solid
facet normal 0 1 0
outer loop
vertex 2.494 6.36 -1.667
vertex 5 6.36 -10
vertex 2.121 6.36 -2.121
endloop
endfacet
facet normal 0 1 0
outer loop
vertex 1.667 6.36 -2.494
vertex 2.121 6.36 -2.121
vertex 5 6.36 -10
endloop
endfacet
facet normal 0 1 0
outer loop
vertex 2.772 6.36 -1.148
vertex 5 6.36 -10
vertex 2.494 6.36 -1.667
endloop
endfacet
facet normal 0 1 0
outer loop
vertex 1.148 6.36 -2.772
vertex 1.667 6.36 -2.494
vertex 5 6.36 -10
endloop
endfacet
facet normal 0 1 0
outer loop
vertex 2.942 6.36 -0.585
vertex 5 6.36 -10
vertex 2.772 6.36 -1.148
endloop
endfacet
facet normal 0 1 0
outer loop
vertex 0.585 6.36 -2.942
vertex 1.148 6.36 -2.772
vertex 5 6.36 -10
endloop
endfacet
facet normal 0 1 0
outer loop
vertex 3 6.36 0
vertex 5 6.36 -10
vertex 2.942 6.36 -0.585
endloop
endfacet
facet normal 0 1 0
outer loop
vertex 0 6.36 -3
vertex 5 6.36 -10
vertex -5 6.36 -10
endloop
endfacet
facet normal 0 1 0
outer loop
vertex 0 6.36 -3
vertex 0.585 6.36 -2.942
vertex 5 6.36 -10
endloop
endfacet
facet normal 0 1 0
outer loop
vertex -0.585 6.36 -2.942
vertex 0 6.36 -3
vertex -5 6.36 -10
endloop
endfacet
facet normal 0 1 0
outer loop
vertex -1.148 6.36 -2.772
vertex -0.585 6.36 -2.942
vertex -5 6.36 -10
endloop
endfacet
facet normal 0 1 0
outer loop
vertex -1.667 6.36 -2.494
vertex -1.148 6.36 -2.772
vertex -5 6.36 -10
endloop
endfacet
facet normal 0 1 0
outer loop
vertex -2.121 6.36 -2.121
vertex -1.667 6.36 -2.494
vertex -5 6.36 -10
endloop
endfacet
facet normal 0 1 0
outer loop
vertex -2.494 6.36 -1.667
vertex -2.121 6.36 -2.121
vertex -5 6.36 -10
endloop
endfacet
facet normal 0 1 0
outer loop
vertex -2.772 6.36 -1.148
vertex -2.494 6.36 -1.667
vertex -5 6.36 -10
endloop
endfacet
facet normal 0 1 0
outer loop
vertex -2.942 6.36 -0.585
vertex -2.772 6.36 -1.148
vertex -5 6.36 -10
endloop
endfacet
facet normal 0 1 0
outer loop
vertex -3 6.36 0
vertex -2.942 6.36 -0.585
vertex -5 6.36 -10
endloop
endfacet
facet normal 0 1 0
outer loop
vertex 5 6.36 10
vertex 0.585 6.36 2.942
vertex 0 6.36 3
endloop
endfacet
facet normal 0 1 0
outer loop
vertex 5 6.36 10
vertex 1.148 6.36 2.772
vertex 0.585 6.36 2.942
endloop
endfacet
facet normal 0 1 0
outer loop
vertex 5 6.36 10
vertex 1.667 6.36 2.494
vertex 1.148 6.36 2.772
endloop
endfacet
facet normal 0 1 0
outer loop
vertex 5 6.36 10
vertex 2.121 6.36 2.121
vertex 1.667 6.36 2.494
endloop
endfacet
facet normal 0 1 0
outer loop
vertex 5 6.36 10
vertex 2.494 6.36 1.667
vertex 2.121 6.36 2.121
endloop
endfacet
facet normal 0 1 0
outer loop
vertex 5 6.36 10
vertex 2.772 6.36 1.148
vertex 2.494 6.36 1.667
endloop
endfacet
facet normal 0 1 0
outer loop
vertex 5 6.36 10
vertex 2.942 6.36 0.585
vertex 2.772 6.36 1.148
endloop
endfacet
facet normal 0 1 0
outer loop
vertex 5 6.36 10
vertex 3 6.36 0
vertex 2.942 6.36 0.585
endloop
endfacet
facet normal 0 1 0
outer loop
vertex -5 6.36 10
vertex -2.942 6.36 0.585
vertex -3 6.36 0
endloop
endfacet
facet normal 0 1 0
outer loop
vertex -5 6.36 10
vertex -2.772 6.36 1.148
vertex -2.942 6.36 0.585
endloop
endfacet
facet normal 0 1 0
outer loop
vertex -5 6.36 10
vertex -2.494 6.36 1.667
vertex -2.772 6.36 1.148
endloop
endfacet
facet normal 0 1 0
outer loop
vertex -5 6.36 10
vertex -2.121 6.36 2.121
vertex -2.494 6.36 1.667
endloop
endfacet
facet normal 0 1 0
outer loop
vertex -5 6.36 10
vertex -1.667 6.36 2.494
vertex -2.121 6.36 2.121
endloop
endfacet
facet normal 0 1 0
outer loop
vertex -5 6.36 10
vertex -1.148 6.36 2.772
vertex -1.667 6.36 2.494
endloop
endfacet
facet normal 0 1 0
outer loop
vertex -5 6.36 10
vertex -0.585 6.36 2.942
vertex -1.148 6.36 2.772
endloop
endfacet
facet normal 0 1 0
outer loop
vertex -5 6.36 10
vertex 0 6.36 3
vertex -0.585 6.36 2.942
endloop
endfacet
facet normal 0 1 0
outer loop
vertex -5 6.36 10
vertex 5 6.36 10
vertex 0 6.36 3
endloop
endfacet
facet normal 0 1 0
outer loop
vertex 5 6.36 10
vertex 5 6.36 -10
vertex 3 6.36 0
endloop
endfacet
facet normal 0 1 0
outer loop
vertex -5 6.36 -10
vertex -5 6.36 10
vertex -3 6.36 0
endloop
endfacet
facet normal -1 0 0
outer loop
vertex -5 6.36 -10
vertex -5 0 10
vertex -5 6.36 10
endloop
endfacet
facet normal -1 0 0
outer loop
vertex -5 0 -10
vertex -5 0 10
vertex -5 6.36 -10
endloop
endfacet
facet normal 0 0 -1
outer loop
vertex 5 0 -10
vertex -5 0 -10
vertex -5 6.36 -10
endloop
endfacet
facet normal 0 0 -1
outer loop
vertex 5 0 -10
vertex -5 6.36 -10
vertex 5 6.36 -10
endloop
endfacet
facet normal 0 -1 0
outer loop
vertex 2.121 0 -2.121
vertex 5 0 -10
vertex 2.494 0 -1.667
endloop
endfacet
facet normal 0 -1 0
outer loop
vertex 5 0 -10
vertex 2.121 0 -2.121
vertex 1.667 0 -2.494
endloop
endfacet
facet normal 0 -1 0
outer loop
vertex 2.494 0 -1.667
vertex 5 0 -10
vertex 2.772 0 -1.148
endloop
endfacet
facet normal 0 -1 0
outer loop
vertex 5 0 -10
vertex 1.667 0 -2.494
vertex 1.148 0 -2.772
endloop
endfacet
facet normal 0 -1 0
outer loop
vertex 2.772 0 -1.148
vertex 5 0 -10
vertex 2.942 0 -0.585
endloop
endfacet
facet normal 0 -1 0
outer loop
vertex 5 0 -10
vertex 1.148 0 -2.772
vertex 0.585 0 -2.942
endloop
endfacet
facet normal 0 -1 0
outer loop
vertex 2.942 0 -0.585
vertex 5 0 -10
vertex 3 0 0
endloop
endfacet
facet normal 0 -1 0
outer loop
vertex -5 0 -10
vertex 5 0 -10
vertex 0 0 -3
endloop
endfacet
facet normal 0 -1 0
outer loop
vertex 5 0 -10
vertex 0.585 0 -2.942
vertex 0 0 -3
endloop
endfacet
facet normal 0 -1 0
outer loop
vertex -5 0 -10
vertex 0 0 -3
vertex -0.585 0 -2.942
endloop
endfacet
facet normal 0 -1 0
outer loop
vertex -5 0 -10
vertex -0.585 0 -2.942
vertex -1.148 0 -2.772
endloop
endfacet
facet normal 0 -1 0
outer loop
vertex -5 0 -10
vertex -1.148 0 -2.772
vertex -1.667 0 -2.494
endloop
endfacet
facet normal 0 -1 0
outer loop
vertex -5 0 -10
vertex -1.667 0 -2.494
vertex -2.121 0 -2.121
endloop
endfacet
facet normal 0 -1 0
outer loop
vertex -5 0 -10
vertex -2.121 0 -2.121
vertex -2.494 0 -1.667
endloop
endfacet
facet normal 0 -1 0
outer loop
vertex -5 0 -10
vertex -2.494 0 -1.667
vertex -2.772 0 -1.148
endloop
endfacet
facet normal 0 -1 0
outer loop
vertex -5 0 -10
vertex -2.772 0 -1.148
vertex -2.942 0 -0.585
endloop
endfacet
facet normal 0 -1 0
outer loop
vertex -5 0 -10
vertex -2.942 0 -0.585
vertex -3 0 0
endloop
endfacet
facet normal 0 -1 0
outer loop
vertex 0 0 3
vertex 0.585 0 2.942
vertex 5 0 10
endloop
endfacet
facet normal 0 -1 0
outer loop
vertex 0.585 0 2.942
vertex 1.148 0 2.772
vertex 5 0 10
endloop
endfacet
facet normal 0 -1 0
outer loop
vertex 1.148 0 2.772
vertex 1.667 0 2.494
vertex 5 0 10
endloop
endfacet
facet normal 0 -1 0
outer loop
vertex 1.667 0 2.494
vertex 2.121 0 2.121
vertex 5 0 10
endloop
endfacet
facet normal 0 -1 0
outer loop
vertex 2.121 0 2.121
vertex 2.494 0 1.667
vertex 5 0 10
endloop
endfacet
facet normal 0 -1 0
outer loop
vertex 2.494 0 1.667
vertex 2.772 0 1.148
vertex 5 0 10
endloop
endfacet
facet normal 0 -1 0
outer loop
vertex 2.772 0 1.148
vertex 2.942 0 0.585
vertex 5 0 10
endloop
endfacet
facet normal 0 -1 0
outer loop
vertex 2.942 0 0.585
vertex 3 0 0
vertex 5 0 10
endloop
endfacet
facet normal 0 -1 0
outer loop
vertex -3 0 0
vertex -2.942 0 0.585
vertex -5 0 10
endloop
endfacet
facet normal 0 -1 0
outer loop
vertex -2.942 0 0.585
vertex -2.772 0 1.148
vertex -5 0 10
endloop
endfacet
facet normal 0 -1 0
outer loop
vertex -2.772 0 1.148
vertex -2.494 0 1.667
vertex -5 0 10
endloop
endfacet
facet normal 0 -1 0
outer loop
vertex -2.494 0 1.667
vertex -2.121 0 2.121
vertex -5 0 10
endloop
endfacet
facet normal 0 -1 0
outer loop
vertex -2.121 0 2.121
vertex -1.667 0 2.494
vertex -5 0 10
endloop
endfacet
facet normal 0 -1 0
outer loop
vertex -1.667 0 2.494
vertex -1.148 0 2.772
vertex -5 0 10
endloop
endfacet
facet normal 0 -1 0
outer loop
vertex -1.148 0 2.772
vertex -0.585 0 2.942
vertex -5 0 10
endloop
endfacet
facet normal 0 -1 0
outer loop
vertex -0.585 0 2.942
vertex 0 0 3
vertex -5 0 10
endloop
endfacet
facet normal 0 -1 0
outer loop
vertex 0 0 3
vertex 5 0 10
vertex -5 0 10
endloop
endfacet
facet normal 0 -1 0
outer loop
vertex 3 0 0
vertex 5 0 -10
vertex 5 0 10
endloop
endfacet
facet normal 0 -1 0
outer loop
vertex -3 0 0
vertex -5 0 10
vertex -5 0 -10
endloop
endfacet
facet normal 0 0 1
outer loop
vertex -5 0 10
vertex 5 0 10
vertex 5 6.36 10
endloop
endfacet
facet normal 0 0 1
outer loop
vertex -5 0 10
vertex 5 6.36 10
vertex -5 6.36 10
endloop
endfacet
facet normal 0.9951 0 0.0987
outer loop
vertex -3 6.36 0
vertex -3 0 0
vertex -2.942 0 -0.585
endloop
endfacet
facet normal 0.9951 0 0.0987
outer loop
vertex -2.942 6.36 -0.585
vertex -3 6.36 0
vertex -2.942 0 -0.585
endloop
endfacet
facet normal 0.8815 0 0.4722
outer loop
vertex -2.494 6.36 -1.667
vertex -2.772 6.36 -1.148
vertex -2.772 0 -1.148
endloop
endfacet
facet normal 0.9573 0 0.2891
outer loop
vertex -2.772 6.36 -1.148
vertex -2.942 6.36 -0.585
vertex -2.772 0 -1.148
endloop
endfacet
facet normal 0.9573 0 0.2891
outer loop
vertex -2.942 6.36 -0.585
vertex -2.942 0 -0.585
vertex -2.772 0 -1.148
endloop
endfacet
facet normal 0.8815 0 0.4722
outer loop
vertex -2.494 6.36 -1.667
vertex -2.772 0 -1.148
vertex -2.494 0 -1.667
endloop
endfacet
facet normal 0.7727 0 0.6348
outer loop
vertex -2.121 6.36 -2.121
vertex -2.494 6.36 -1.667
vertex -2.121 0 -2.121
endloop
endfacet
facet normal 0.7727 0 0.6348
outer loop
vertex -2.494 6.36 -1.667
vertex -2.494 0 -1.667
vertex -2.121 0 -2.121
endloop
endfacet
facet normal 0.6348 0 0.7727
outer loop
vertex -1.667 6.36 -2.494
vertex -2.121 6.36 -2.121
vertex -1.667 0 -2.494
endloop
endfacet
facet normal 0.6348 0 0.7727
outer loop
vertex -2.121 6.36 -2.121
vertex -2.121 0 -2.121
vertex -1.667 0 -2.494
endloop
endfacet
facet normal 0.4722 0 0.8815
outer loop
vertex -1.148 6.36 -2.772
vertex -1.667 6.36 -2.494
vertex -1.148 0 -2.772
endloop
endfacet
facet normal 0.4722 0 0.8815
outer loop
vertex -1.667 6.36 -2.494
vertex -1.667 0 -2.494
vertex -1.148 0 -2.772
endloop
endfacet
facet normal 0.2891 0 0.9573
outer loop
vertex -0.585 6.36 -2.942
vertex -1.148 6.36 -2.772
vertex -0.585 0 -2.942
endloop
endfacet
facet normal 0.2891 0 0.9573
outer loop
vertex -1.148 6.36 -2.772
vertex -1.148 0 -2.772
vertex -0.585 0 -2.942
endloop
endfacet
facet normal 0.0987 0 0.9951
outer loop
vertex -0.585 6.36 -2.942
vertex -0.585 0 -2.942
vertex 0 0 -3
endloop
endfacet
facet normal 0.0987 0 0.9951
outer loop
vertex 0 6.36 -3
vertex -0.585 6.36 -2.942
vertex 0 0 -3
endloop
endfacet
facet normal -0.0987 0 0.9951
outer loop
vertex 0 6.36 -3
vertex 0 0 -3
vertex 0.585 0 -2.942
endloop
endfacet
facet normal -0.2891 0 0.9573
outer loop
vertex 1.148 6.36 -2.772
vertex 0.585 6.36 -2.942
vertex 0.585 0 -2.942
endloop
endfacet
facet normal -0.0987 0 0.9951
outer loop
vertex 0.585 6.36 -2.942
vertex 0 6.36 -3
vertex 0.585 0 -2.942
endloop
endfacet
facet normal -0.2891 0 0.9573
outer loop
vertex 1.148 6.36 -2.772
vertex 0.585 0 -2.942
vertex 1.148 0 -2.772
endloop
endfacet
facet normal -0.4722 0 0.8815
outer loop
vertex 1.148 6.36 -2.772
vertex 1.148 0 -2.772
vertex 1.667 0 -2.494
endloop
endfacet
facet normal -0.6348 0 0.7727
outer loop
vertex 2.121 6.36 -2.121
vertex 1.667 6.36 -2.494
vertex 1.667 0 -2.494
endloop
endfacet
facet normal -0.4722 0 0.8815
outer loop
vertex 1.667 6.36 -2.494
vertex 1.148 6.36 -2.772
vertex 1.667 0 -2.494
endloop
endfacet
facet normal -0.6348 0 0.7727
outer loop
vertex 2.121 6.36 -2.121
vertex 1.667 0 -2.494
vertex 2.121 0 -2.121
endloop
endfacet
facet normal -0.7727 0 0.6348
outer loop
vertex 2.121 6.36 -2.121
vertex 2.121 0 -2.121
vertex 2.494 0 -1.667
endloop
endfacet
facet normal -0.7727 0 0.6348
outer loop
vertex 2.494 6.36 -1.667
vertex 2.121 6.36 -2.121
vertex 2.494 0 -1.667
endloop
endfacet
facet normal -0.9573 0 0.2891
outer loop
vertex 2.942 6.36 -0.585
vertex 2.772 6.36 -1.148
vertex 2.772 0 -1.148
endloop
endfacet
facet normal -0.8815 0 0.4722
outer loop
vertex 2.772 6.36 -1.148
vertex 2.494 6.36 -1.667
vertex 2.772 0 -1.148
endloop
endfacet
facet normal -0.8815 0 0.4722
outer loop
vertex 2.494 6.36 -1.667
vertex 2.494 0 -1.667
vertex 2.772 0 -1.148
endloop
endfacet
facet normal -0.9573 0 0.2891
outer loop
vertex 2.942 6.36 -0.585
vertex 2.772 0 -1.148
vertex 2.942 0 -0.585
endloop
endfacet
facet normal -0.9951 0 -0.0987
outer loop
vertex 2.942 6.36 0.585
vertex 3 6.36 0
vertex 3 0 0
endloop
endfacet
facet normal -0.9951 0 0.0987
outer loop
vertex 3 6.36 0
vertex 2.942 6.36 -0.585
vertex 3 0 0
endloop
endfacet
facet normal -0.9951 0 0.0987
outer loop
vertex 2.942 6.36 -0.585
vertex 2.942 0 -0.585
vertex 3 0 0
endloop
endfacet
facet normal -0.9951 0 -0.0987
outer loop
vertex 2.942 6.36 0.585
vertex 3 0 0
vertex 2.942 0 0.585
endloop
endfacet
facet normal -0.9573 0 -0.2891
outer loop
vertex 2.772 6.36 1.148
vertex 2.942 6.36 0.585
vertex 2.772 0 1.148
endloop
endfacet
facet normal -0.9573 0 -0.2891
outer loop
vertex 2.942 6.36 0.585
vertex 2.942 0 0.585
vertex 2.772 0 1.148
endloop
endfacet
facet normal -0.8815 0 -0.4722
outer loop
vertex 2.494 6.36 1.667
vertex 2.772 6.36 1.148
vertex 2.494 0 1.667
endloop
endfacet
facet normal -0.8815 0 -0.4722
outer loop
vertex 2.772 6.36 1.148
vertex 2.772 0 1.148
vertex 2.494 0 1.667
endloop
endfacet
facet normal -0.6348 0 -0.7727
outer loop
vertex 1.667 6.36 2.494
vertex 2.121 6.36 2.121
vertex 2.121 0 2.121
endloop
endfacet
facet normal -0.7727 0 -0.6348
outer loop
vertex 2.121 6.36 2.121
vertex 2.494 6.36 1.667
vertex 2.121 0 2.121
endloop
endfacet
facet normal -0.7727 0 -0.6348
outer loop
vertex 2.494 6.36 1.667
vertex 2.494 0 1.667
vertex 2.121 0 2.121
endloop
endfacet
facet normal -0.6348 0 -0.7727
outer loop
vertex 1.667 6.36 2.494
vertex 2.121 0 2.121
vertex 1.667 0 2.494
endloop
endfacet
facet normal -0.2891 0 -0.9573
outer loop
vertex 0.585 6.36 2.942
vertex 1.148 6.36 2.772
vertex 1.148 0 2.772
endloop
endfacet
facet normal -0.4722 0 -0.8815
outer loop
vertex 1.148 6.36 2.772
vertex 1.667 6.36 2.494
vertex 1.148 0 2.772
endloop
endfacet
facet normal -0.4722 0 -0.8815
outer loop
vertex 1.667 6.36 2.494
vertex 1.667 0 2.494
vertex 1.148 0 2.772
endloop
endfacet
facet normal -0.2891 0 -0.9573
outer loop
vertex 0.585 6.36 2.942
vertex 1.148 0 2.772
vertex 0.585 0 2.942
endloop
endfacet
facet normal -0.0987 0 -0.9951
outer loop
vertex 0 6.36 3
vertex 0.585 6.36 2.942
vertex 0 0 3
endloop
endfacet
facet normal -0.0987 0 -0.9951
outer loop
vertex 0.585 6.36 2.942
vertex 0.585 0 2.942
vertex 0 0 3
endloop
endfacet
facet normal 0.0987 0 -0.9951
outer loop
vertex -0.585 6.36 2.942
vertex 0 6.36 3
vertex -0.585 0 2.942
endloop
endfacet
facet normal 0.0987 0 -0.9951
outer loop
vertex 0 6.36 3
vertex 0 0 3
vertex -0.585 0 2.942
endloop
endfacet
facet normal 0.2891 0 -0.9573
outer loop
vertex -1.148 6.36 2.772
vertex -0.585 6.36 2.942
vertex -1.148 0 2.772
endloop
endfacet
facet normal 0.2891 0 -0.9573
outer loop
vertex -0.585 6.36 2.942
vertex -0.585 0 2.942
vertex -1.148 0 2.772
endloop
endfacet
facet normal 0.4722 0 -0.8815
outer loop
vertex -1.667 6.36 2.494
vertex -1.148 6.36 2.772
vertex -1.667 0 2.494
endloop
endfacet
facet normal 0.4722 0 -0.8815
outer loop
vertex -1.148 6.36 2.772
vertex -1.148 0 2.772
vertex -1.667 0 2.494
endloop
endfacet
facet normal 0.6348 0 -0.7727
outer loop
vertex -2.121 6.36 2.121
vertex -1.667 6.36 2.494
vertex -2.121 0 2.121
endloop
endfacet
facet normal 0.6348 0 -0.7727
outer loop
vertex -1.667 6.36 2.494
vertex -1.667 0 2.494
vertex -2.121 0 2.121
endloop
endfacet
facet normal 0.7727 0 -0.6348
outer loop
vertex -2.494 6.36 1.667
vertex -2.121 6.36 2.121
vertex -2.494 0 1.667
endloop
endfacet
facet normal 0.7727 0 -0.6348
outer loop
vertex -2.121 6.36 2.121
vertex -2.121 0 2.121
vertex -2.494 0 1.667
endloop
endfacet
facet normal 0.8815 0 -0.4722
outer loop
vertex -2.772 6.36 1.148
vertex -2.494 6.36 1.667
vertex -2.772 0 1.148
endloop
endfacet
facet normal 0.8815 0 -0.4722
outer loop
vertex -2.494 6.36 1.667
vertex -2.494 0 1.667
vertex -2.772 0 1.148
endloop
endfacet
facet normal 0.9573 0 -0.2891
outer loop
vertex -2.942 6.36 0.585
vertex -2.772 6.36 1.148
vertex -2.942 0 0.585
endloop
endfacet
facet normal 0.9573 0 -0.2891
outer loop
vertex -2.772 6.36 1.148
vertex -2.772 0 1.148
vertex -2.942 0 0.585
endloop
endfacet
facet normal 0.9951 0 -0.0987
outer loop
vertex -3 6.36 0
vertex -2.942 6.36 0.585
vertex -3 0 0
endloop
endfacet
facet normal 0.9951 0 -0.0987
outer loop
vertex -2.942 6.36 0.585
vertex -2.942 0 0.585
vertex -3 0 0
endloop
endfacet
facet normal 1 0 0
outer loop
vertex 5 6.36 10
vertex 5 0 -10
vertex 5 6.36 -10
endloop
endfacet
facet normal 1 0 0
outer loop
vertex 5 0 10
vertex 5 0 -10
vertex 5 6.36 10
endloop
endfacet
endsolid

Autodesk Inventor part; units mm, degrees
ref_plane "YZ Plane" through (0, 0, 0) normal (1, 0, 0) x (0, 1, 0)
ref_plane "XZ Plane" through (0, 0, 0) normal (0, 1, 0) x (-1, 0, 0)
ref_plane "XY Plane" through (0, 0, 0) normal (0, 0, 1) x (1, 0, 0)
sketch "Sketch1" plane through (0, 0, 0) normal (0, 1, 0) x (-1, 0, 0)
  circle A0 centre (0, 0) radius 3
  line L0 (-5, 10) -> (5, 10)
  line L1 (5, 10) -> (5, -10)
  line L2 (5, -10) -> (-5, -10)
  line L3 (-5, -10) -> (-5, 10)
  line L4 (-5, 10) -> (5, -10) construction
  line L5 (5, 10) -> (-5, -10) construction
  dimension "d0" = 6
  dimension "d1" = 10
  dimension "d2" = 20
extrude "Extrusion1" add sketch "Sketch1" along normal blind 6.36
properties part number "Brazo_eje"
